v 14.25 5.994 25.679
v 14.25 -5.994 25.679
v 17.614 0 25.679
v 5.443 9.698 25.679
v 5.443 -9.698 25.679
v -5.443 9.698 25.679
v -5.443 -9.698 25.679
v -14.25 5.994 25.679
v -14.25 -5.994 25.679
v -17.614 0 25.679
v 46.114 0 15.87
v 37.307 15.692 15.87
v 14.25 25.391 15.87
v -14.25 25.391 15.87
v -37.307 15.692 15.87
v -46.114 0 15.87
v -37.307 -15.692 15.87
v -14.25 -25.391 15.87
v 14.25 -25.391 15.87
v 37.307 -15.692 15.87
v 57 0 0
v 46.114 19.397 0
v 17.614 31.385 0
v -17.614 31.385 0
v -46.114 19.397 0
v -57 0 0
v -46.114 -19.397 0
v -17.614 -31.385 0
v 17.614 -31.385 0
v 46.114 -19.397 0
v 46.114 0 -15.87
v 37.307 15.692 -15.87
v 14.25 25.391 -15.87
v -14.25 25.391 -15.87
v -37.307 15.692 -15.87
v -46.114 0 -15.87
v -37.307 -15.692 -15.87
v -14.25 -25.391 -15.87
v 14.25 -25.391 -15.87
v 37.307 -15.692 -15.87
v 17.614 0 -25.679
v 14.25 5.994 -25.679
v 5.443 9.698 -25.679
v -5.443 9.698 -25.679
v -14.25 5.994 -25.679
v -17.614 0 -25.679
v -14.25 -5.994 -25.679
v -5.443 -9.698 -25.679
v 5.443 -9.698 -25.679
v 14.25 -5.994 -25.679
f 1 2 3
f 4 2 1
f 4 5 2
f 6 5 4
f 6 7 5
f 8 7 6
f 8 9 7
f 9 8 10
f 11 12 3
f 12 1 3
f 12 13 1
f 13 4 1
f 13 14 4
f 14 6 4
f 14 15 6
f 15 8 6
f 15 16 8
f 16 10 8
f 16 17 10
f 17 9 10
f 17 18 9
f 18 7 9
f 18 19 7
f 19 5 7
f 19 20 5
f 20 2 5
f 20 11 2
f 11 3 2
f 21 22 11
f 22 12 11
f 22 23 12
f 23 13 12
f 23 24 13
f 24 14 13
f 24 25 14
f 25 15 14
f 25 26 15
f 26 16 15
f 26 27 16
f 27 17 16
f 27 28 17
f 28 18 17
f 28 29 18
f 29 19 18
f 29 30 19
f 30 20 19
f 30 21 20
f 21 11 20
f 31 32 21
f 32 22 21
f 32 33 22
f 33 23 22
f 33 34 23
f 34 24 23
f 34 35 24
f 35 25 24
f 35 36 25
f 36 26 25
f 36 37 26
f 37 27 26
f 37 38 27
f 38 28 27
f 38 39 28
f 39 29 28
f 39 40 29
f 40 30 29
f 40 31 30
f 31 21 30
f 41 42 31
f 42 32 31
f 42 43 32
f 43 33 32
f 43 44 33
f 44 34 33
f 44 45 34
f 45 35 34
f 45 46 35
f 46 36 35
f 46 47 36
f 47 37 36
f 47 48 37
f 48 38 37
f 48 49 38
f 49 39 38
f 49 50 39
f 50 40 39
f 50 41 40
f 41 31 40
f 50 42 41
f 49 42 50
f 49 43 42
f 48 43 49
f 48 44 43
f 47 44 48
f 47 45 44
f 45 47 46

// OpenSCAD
// Generated by SolidPython 1.0.1 on 2020-07-29 00:46:54


scale(v = [19, 11, 9]) {
	sphere(r = 3);
}
/***********************************************
*********      SolidPython code:      **********
************************************************
 
# import packages: SolidPython
from solid import *
from solid.utils import *
from itertools import chain, combinations, permutations


class Resize:

    def __init__(self, scad_file):
        self.scad_file = scad_file
        #self.scad_file = import_scad(scad_file)
        # cone/cylinder param:
        self.r1 = 0
        self.r2 = 0
        self.h = 0
        # rectangular prism param:
        self.w = 0
        self.l = 0
        # ellipse param:
        self.r = 0

    # import OpenScad code (file name corresponds to shape)


    # classify shape + parameters
    def assign(self, param1, param2, param3):
        if self.scad_file == 'cone.scad':
            self.r1 = param1
            self.r2 = param2
            self.h = param3
        elif self.scad_file == 'cylinder.scad':
            self.r1 = param1
            self.r2 = param2
            self.h = param3
        elif self.scad_file == 'rectangularPrism.scad':
            self.h = param1
            self.l = param2
            self.w = param3
        else:
            self.r = param1
            self.h = param2

    # resize parameters
    def iterate(self):
        x = range(3, 20, 2)
        i = 1
        if self.scad_file == 'cone.scad':
            tempList = list(permutations(x, 2))
            for temp in tempList:
                param1 = temp[0]
                param2 = temp[1]
                filepath = 'produced_scad_files/' + 'cone' + str(param1) + '_' + str(param2) + '_' + '.scad'
                scad_render_to_file(cylinder(h=param1, r1=param2, r2=0), filepath)

        elif self.scad_file == 'cylinder.scad':
            tempList = list(permutations(x, 3))
            for temp in tempList:
                param1 = temp[0]
                param2 = temp[1]
                filepath = 'produced_scad_files/' + 'cylinder' + str(param1) + '_' + str(param2) + '_' + '.scad'
                scad_render_to_file(cylinder(h=param1, r1=param2, r2=param2), filepath)

        elif self.scad_file == 'rectangularPrism.scad':
            tempList = list(permutations(x, 3))
            for temp in tempList:
                param1 = temp[0]
                param2 = temp[1]
                param3 = temp[2]
                filepath = 'produced_scad_files/' + 'rectangularPrism' + str(param1) + '_' + str(param2) + '_' + str(
                    param3) + '.scad'
                scad_render_to_file(cube(size=(param1, param2, param3)), filepath)

        elif self.scad_file == 'ellipse.scad':
            tempList = list(permutations(x, 4))
            for temp in tempList:
                param1 = temp[0]
                param2 = temp[1]
                param3 = temp[2]
                param4 = temp[3]
                filepath = 'produced_scad_files/' + 'ellipse' + str(param1) + '_' + str(param2) + '_' + str(param3) + '_' + str(param4) + '.scad'
                scad_render_to_file(scale([param1, param2, param3])(sphere(r=param4)), filepath)

    def render_to_scadfile(self):
        scad_render_to_file(scad, 'example.scad') 
 
************************************************/
